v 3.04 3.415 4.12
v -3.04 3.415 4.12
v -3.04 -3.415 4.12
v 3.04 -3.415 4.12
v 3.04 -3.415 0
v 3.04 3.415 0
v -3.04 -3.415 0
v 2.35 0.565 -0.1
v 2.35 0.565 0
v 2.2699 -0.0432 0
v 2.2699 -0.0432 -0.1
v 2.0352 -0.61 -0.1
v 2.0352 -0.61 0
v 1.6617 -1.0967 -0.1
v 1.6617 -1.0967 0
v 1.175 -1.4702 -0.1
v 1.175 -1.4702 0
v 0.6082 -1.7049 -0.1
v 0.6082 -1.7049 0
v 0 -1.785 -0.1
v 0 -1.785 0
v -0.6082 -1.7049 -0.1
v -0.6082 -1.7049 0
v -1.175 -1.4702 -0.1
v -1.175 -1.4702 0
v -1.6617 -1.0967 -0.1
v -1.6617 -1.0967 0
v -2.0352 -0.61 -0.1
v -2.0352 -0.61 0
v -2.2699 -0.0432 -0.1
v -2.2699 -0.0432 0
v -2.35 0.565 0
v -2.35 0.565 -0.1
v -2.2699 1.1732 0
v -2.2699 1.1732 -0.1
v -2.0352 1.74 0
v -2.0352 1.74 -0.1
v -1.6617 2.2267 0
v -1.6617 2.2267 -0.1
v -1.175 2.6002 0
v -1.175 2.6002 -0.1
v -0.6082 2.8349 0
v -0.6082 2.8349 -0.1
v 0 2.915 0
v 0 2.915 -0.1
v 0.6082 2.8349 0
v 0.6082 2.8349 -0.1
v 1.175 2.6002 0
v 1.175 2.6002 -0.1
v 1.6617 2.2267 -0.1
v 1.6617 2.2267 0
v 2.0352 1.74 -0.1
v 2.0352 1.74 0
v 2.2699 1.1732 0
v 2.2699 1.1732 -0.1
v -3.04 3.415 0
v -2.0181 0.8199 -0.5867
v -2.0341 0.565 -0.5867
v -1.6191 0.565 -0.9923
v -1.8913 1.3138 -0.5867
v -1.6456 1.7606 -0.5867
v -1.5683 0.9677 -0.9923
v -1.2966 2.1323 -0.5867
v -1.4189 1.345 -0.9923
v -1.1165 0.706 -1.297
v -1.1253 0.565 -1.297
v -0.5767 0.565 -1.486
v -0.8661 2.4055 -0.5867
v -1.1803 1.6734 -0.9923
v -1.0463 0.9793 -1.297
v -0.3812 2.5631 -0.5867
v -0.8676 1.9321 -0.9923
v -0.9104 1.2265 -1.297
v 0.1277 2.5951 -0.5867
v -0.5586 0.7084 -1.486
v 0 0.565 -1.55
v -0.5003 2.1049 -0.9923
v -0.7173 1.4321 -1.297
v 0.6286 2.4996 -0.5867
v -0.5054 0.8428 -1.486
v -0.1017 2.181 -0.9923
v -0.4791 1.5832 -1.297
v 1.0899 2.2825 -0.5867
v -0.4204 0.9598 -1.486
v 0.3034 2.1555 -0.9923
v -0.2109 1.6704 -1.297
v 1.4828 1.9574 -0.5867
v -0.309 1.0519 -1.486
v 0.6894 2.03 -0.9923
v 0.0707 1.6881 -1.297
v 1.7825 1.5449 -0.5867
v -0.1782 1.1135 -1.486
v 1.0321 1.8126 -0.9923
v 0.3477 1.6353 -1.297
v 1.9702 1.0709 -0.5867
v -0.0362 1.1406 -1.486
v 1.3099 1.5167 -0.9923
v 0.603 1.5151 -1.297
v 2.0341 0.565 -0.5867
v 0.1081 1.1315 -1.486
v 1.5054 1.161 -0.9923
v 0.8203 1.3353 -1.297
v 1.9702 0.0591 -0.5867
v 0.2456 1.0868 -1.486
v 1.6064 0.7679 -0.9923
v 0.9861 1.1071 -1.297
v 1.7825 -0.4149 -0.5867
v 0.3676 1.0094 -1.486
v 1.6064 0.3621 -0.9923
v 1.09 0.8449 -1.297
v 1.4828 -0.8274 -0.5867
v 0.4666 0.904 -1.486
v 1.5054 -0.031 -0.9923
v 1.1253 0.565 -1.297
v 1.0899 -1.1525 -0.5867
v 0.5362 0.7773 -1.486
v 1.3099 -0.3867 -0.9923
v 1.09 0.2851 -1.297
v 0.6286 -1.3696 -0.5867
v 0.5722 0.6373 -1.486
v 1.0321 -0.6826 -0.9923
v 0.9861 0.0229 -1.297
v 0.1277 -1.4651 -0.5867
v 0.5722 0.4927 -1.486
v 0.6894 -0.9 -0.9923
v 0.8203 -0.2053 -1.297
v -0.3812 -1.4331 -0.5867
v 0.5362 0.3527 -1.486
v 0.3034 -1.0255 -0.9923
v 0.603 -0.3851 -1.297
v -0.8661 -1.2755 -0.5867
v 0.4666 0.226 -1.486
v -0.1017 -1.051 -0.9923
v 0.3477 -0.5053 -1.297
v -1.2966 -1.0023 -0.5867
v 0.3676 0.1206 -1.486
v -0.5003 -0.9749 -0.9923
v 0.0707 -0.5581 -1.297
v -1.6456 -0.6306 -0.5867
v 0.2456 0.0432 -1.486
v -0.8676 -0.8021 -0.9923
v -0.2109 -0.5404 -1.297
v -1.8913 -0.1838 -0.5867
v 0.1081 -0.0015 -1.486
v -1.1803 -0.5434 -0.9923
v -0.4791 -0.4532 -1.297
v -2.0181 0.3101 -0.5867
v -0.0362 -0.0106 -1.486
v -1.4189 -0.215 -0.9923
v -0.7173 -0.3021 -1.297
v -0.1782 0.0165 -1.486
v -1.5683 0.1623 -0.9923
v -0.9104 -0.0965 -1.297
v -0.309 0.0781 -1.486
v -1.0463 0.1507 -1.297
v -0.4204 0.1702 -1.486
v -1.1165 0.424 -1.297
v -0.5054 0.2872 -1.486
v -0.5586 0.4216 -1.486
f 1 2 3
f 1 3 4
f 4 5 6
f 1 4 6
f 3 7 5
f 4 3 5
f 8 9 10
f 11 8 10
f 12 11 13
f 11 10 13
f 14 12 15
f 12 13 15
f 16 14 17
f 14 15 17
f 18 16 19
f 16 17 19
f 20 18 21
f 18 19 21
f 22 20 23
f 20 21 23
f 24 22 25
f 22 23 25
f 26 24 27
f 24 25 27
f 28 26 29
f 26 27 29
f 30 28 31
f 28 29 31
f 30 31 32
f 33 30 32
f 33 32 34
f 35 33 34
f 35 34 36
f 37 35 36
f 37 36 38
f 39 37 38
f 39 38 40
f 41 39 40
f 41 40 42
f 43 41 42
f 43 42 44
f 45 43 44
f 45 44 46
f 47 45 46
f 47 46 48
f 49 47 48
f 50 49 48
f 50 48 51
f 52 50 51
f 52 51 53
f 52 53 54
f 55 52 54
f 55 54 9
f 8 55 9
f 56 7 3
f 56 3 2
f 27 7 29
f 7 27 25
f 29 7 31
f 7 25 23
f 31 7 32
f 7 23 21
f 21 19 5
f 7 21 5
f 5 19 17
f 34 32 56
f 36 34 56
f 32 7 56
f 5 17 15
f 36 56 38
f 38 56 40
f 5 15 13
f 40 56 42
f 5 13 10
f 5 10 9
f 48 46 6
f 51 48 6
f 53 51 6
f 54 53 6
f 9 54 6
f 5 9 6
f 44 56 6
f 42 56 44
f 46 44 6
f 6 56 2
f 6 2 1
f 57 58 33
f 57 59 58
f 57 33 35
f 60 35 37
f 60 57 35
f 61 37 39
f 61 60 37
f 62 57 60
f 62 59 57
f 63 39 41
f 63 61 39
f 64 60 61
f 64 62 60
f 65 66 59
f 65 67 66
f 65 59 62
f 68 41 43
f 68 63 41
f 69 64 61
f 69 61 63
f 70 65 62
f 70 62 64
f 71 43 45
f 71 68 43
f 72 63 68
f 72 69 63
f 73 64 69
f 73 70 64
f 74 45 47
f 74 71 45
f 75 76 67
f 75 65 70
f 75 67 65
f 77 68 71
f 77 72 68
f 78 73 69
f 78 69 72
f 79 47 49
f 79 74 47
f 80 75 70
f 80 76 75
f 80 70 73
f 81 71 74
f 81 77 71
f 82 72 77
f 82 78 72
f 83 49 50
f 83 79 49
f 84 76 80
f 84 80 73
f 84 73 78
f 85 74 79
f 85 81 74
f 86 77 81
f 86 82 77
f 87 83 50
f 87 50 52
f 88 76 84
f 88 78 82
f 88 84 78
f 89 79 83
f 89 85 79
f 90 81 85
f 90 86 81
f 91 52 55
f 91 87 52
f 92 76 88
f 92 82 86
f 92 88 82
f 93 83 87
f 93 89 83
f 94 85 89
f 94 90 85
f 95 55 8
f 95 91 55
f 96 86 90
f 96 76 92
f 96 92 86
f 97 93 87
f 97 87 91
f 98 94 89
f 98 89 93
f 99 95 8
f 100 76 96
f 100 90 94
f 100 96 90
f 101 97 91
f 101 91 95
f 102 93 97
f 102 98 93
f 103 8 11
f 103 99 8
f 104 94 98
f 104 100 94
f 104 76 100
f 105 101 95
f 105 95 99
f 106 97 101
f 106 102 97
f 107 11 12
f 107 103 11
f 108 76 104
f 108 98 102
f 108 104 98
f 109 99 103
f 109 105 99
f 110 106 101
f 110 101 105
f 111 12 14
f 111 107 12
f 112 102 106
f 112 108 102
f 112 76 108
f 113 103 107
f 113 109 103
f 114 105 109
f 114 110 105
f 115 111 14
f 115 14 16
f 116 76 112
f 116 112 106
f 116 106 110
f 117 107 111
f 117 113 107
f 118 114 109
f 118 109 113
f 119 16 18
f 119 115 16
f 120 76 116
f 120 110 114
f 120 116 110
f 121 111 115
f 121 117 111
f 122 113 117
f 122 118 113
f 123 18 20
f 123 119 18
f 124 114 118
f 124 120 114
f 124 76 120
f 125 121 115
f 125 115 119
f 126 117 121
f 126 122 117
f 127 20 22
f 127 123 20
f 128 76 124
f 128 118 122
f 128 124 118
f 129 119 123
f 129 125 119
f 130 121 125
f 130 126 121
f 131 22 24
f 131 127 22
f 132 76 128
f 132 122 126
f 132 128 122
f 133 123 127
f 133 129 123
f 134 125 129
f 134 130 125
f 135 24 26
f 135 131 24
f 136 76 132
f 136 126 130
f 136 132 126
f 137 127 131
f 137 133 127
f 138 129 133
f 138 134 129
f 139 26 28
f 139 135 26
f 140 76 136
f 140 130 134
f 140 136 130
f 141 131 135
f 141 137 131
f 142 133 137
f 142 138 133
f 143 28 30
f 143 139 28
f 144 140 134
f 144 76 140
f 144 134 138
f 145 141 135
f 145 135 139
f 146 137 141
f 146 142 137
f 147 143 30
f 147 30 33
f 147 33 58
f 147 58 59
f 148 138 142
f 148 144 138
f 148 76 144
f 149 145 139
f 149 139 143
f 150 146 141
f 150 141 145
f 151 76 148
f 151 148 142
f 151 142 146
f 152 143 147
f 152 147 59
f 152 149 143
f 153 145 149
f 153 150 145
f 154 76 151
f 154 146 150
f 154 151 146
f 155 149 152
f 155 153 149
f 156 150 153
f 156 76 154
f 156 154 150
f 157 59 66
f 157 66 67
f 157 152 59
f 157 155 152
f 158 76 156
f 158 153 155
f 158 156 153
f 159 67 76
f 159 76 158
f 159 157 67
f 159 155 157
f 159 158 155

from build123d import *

# Parameters (mm, degrees)
SKETCH_1_W         = 6.08
SKETCH_1_H         = 6.83
EXTRUDE_1_DEPTH    = 4.12
SKETCH_2_R         = 2.35
EXTRUDE_2_DEPTH    = 0.1
DOME_1_FACE_RADIUS = 2.35
DOME_1_HEIGHT      = 1.45


with BuildPart() as part:
    # 草图1 → 拉伸1 (new body)
    with BuildSketch(Plane.XY):
        Rectangle(SKETCH_1_W, SKETCH_1_H)
    extrude(amount=EXTRUDE_1_DEPTH)

    # 草图2 → 拉伸2 (add)
    with BuildSketch(Plane(origin=(0, 0, 0), x_dir=(-1, 0, 0), z_dir=(0, 0, -1))):
        with Locations(Location((0, 0.565, 0), (0, 0, 180))):
            Circle(SKETCH_2_R)
    extrude(amount=EXTRUDE_2_DEPTH)

    # 圆顶1: a dome of height H over a round flat face of radius A is a cap of a sphere of radius (A * A + H * H) / (2 * H)
    dome_1_r = (DOME_1_FACE_RADIUS * DOME_1_FACE_RADIUS + DOME_1_HEIGHT * DOME_1_HEIGHT) / (2 * DOME_1_HEIGHT)
    dome_1_base = Plane((0, 0.565, -0.1), z_dir=(0, 0, -1))
    with Locations(dome_1_base.offset(DOME_1_HEIGHT - dome_1_r)):
        dome_1_ball = Sphere(dome_1_r, mode=Mode.PRIVATE)
    add(split(dome_1_ball, bisect_by=dome_1_base, keep=Keep.TOP, mode=Mode.PRIVATE))


solid = part.part
